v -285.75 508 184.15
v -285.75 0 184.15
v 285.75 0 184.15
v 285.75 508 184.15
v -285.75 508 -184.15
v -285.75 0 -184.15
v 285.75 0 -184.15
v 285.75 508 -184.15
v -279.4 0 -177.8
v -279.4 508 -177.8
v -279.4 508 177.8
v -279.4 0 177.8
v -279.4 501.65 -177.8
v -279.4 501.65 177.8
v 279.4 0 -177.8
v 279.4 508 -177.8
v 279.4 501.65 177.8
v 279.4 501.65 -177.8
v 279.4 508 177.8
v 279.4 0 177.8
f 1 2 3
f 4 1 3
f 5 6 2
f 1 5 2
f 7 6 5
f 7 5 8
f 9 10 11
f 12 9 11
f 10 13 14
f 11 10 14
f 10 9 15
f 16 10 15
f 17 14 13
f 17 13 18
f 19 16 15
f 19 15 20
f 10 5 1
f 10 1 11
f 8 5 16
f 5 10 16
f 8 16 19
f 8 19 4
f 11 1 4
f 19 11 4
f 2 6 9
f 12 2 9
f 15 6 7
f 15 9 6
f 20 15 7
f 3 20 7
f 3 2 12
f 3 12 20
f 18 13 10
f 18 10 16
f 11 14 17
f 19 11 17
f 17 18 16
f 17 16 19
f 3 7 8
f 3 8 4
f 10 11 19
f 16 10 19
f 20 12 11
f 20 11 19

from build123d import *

# Parameters (mm, degrees)
F0_W     = 571.5
F0_H     = 368.3
F0_W_2   = 558.8
F0_H_2   = 355.6
F1_DEPTH = 508
F2_START = -501.65
F2_DEPTH = 6.35


with BuildPart() as f1:
    # F0 (on Front) → F1 (new body)
    with BuildSketch(Plane.XZ):
        Rectangle(F0_W, F0_H)
        Rectangle(F0_W_2, F0_H_2, mode=Mode.SUBTRACT)
    extrude(amount=-F1_DEPTH)


with BuildPart() as f2:
    # F0 (on Front) → F2 (new body)
    with BuildSketch(Plane.XZ.offset(F2_START)):
        Rectangle(F0_W_2, F0_H_2)
    extrude(amount=-F2_DEPTH)


solid = Compound([f1.part, f2.part])
